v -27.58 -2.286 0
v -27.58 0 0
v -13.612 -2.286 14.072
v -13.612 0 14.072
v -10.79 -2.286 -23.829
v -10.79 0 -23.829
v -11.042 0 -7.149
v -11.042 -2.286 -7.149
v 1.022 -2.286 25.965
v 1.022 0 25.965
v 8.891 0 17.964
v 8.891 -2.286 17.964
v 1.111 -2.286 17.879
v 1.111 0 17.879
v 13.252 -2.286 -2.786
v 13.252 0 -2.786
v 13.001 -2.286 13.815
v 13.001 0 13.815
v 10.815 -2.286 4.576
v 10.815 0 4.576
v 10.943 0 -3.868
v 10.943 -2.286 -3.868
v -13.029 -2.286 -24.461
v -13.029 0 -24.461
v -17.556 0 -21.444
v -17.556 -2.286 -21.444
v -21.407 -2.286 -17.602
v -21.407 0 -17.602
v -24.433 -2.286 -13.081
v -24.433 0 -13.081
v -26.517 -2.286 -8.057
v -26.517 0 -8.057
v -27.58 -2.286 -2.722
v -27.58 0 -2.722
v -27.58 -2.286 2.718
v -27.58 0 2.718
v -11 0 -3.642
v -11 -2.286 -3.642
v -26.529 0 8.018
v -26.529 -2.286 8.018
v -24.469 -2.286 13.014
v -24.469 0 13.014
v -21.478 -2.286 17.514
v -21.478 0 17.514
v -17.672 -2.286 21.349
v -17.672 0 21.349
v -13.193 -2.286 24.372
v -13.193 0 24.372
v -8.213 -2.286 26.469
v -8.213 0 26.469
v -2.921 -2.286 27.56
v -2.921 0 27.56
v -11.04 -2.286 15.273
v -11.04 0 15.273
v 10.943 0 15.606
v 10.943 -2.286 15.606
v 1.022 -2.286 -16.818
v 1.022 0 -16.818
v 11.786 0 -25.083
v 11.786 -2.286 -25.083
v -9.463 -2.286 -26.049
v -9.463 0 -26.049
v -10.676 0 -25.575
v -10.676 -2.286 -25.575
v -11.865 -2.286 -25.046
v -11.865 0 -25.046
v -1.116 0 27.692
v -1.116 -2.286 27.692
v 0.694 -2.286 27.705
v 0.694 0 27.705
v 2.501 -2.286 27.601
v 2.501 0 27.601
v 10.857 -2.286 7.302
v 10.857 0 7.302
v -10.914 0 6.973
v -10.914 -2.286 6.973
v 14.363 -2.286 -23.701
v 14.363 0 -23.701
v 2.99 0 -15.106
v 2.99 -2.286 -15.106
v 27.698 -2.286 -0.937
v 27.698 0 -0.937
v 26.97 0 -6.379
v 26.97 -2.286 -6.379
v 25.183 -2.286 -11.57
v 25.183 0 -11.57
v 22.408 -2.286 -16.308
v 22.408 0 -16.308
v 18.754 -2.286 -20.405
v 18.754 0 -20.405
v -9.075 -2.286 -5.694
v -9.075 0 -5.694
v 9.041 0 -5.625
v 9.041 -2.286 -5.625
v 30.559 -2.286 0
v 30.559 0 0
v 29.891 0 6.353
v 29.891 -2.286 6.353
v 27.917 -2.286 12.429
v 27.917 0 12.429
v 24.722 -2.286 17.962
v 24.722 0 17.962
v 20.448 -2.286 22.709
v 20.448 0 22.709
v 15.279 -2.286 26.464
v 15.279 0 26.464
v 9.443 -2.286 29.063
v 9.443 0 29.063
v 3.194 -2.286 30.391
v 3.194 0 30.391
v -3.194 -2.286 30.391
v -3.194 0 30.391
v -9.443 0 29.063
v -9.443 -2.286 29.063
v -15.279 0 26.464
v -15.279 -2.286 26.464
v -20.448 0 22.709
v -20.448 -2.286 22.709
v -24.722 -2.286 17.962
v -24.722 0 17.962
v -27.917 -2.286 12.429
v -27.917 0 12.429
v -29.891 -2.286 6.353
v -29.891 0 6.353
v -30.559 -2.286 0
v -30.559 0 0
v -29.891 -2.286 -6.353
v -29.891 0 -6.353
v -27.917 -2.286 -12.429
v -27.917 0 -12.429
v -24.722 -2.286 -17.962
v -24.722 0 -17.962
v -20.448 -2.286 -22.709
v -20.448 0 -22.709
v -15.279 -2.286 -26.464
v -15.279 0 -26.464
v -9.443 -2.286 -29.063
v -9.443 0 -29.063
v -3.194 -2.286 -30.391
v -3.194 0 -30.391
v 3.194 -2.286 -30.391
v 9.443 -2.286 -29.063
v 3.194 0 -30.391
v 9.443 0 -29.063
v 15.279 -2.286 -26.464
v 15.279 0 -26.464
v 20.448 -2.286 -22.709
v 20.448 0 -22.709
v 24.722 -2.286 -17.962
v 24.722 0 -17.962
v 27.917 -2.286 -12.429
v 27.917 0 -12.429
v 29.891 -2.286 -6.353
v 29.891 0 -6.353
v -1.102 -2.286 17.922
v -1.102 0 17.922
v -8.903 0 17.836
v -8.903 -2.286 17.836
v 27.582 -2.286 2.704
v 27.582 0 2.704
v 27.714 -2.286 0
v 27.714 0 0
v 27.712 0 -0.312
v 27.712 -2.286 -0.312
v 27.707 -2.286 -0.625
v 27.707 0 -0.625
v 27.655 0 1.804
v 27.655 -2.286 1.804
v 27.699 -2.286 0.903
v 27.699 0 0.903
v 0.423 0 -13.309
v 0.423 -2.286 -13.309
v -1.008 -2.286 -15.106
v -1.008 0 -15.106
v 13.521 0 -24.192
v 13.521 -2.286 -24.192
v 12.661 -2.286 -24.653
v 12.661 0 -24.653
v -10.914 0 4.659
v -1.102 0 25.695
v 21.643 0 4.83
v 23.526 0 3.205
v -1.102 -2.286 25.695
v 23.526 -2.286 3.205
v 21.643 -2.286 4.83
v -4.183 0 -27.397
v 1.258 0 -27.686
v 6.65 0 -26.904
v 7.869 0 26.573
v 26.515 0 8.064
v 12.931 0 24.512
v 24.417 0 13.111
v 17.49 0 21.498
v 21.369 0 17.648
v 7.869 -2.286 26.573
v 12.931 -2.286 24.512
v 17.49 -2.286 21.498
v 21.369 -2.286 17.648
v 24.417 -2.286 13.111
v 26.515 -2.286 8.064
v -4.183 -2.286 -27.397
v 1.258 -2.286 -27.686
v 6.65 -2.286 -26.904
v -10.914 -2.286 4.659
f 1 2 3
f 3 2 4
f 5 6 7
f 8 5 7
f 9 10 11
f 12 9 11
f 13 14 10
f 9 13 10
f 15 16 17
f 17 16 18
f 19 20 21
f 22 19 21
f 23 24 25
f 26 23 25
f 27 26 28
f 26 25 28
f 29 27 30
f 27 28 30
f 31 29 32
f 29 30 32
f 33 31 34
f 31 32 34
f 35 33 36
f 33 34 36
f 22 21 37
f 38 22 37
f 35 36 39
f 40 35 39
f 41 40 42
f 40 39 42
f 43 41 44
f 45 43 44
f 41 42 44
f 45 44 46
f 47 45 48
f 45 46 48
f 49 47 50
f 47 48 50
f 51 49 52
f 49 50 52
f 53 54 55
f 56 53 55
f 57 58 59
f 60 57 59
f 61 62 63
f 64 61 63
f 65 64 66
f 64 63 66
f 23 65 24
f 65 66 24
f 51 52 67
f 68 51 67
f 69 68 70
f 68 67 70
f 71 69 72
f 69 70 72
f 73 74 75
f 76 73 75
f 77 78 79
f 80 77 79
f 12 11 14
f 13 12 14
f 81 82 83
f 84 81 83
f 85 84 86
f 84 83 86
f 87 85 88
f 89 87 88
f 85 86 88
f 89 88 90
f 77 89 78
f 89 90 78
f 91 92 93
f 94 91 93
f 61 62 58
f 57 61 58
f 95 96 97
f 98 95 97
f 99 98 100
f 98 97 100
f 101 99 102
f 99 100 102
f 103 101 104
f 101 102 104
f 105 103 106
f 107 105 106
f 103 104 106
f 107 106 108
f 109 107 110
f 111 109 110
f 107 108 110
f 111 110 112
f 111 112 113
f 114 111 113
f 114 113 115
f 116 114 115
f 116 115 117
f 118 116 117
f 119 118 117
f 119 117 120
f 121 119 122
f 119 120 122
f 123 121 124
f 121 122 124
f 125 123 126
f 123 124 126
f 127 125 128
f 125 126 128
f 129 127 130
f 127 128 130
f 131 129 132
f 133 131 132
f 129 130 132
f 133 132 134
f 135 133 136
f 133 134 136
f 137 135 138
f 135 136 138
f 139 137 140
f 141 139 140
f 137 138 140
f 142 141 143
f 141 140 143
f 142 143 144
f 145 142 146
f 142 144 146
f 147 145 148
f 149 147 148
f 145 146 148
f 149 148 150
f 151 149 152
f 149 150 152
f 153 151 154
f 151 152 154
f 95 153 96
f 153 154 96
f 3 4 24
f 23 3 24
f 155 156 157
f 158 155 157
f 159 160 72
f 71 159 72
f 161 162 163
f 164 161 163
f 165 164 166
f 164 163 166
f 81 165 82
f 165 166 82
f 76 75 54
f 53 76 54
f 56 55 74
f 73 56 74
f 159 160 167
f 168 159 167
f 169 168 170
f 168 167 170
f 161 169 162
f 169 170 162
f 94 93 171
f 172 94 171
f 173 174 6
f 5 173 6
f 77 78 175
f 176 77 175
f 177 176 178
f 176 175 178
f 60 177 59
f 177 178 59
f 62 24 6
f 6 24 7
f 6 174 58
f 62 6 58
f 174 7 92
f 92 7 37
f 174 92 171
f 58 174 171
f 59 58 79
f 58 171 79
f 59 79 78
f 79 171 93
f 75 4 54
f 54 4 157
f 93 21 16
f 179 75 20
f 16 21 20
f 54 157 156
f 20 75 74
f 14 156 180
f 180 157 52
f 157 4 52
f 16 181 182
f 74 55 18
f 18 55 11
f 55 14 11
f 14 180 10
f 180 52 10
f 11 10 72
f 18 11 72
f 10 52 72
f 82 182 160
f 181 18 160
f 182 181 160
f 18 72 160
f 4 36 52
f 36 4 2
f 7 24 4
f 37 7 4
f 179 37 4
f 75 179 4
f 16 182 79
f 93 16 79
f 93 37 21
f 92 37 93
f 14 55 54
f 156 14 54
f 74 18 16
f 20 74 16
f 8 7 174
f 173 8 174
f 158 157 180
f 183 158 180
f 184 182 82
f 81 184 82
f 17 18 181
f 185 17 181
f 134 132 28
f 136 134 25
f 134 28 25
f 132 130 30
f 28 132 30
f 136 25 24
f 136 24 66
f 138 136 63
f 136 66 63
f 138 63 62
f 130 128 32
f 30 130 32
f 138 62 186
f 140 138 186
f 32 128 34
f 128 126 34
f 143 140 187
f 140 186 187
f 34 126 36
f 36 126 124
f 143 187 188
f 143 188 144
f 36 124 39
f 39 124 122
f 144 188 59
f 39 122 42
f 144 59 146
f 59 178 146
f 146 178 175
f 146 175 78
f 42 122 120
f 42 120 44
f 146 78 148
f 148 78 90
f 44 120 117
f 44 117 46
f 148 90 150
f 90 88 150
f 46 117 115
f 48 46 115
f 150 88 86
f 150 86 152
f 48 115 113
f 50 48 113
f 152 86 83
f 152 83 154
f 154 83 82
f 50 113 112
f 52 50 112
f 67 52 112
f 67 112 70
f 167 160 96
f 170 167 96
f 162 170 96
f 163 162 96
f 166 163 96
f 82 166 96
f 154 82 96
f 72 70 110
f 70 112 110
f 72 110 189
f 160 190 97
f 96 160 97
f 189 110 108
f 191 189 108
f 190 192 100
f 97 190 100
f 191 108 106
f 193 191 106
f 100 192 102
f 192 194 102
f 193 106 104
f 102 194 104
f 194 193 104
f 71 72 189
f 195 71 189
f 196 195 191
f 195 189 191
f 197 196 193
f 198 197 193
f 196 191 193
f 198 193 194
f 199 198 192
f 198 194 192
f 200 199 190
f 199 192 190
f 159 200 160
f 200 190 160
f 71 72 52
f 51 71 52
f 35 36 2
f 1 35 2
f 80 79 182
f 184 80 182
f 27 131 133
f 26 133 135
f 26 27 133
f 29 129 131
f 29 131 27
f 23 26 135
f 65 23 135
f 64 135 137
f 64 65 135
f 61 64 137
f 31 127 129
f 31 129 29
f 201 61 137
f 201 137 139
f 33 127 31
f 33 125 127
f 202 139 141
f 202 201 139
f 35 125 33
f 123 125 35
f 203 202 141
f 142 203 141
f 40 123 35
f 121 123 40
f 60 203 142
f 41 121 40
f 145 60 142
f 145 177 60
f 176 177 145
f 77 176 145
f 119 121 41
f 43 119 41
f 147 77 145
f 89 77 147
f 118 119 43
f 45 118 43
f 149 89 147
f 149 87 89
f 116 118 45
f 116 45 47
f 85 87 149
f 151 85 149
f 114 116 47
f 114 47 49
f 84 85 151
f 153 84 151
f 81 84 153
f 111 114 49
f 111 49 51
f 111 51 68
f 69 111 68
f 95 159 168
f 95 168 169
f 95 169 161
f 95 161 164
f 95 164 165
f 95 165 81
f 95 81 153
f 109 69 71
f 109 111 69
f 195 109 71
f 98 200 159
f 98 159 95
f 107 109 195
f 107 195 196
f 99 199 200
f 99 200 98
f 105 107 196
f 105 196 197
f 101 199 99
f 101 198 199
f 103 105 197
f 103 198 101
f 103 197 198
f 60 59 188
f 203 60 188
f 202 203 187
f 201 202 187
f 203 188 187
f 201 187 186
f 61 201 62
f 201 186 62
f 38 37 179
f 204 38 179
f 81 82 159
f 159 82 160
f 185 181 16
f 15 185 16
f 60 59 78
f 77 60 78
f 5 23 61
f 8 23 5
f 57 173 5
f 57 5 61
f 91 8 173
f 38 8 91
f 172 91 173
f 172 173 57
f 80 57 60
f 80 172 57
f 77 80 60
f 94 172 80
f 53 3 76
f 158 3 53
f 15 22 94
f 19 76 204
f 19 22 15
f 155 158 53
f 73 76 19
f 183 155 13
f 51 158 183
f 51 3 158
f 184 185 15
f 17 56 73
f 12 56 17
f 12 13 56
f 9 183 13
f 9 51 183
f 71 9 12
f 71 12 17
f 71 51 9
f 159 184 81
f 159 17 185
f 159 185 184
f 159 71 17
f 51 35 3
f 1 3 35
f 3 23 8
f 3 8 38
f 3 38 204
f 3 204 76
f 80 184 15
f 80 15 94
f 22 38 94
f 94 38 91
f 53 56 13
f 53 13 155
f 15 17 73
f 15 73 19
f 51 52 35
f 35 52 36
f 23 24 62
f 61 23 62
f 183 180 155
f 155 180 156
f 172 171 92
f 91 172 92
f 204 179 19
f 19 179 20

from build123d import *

# Parameters (mm, degrees)
F0_R     = 30.558504
F1_DEPTH = 2.286


with BuildPart() as f1:
    # F0 (on Front) → F1 (new body)
    with BuildSketch(Plane.XZ):
        Circle(F0_R)
        with BuildLine():
            ThreePointArc((27.581866, 2.703907), (27.681009, 1.353569), (27.714083, 0))
            ThreePointArc((27.714083, 0), (27.710121, -0.468625), (27.698235, -0.937116))
            ThreePointArc((27.698235, -0.937116), (23.913413, -14.007823), (14.363487, -23.701491))
            ThreePointArc((14.363487, -23.701491), (13.092748, -24.426428), (11.785525, -25.083298))
            ThreePointArc((11.785525, -25.083298), (1.257661, -27.685533), (-9.462777, -26.048537))
            ThreePointArc((-9.462777, -26.048537), (-11.27376, -25.31744), (-13.028759, -24.460619))
            ThreePointArc((-13.028759, -24.460619), (-24.432539, -13.081339), (-27.580463, 2.718179))
            ThreePointArc((-27.580463, 2.718179), (-19.668706, 19.524662), (-2.92083, 27.559738))
            ThreePointArc((-2.92083, 27.559738), (-0.210877, 27.713281), (2.501099, 27.600995))
            ThreePointArc((2.501099, 27.600995), (19.524662, 19.668706), (27.581866, 2.703907))
        make_face(mode=Mode.SUBTRACT)
        Polygon((27.698235, -0.937116), (27.581866, 2.703907), (2.501099, 27.600995), (-2.92083, 27.559738), (-27.580463, 2.718179), (-27.580463, 0), (-13.611677, 14.071841), (-13.028759, -24.460619), (-9.462777, -26.048537), (1.022188, -16.817508), (11.785525, -25.083298), (14.363487, -23.701491), (2.990186, -15.106206), (23.525823, 3.20474), align=None)
        Polygon((-10.790164, -23.828741), (-11.0425, -7.148646), (-1.007884, -15.106206), align=None, mode=Mode.SUBTRACT)
        Polygon((0.423232, -13.309337), (-9.074502, -5.694038), (9.040986, -5.625172), align=None, mode=Mode.SUBTRACT)
        Polygon((-10.999883, -3.641794), (-10.914402, 4.659347), (10.814924, 4.575656), (10.942655, -3.867745), align=None, mode=Mode.SUBTRACT)
        Polygon((10.857149, 7.302198), (-10.914402, 6.972839), (-11.039972, 15.273349), (10.942655, 15.605902), align=None, mode=Mode.SUBTRACT)
        Polygon((-1.102256, 17.921947), (-8.903372, 17.836383), (-1.102256, 25.695052), align=None, mode=Mode.SUBTRACT)
        Polygon((13.252449, -2.7862), (13.00131, 13.814819), (21.643393, 4.830477), align=None, mode=Mode.SUBTRACT)
        Polygon((1.110876, 17.879165), (1.022188, 25.965074), (8.8909, 17.964498), align=None, mode=Mode.SUBTRACT)
    extrude(amount=F1_DEPTH)


solid = f1.part
